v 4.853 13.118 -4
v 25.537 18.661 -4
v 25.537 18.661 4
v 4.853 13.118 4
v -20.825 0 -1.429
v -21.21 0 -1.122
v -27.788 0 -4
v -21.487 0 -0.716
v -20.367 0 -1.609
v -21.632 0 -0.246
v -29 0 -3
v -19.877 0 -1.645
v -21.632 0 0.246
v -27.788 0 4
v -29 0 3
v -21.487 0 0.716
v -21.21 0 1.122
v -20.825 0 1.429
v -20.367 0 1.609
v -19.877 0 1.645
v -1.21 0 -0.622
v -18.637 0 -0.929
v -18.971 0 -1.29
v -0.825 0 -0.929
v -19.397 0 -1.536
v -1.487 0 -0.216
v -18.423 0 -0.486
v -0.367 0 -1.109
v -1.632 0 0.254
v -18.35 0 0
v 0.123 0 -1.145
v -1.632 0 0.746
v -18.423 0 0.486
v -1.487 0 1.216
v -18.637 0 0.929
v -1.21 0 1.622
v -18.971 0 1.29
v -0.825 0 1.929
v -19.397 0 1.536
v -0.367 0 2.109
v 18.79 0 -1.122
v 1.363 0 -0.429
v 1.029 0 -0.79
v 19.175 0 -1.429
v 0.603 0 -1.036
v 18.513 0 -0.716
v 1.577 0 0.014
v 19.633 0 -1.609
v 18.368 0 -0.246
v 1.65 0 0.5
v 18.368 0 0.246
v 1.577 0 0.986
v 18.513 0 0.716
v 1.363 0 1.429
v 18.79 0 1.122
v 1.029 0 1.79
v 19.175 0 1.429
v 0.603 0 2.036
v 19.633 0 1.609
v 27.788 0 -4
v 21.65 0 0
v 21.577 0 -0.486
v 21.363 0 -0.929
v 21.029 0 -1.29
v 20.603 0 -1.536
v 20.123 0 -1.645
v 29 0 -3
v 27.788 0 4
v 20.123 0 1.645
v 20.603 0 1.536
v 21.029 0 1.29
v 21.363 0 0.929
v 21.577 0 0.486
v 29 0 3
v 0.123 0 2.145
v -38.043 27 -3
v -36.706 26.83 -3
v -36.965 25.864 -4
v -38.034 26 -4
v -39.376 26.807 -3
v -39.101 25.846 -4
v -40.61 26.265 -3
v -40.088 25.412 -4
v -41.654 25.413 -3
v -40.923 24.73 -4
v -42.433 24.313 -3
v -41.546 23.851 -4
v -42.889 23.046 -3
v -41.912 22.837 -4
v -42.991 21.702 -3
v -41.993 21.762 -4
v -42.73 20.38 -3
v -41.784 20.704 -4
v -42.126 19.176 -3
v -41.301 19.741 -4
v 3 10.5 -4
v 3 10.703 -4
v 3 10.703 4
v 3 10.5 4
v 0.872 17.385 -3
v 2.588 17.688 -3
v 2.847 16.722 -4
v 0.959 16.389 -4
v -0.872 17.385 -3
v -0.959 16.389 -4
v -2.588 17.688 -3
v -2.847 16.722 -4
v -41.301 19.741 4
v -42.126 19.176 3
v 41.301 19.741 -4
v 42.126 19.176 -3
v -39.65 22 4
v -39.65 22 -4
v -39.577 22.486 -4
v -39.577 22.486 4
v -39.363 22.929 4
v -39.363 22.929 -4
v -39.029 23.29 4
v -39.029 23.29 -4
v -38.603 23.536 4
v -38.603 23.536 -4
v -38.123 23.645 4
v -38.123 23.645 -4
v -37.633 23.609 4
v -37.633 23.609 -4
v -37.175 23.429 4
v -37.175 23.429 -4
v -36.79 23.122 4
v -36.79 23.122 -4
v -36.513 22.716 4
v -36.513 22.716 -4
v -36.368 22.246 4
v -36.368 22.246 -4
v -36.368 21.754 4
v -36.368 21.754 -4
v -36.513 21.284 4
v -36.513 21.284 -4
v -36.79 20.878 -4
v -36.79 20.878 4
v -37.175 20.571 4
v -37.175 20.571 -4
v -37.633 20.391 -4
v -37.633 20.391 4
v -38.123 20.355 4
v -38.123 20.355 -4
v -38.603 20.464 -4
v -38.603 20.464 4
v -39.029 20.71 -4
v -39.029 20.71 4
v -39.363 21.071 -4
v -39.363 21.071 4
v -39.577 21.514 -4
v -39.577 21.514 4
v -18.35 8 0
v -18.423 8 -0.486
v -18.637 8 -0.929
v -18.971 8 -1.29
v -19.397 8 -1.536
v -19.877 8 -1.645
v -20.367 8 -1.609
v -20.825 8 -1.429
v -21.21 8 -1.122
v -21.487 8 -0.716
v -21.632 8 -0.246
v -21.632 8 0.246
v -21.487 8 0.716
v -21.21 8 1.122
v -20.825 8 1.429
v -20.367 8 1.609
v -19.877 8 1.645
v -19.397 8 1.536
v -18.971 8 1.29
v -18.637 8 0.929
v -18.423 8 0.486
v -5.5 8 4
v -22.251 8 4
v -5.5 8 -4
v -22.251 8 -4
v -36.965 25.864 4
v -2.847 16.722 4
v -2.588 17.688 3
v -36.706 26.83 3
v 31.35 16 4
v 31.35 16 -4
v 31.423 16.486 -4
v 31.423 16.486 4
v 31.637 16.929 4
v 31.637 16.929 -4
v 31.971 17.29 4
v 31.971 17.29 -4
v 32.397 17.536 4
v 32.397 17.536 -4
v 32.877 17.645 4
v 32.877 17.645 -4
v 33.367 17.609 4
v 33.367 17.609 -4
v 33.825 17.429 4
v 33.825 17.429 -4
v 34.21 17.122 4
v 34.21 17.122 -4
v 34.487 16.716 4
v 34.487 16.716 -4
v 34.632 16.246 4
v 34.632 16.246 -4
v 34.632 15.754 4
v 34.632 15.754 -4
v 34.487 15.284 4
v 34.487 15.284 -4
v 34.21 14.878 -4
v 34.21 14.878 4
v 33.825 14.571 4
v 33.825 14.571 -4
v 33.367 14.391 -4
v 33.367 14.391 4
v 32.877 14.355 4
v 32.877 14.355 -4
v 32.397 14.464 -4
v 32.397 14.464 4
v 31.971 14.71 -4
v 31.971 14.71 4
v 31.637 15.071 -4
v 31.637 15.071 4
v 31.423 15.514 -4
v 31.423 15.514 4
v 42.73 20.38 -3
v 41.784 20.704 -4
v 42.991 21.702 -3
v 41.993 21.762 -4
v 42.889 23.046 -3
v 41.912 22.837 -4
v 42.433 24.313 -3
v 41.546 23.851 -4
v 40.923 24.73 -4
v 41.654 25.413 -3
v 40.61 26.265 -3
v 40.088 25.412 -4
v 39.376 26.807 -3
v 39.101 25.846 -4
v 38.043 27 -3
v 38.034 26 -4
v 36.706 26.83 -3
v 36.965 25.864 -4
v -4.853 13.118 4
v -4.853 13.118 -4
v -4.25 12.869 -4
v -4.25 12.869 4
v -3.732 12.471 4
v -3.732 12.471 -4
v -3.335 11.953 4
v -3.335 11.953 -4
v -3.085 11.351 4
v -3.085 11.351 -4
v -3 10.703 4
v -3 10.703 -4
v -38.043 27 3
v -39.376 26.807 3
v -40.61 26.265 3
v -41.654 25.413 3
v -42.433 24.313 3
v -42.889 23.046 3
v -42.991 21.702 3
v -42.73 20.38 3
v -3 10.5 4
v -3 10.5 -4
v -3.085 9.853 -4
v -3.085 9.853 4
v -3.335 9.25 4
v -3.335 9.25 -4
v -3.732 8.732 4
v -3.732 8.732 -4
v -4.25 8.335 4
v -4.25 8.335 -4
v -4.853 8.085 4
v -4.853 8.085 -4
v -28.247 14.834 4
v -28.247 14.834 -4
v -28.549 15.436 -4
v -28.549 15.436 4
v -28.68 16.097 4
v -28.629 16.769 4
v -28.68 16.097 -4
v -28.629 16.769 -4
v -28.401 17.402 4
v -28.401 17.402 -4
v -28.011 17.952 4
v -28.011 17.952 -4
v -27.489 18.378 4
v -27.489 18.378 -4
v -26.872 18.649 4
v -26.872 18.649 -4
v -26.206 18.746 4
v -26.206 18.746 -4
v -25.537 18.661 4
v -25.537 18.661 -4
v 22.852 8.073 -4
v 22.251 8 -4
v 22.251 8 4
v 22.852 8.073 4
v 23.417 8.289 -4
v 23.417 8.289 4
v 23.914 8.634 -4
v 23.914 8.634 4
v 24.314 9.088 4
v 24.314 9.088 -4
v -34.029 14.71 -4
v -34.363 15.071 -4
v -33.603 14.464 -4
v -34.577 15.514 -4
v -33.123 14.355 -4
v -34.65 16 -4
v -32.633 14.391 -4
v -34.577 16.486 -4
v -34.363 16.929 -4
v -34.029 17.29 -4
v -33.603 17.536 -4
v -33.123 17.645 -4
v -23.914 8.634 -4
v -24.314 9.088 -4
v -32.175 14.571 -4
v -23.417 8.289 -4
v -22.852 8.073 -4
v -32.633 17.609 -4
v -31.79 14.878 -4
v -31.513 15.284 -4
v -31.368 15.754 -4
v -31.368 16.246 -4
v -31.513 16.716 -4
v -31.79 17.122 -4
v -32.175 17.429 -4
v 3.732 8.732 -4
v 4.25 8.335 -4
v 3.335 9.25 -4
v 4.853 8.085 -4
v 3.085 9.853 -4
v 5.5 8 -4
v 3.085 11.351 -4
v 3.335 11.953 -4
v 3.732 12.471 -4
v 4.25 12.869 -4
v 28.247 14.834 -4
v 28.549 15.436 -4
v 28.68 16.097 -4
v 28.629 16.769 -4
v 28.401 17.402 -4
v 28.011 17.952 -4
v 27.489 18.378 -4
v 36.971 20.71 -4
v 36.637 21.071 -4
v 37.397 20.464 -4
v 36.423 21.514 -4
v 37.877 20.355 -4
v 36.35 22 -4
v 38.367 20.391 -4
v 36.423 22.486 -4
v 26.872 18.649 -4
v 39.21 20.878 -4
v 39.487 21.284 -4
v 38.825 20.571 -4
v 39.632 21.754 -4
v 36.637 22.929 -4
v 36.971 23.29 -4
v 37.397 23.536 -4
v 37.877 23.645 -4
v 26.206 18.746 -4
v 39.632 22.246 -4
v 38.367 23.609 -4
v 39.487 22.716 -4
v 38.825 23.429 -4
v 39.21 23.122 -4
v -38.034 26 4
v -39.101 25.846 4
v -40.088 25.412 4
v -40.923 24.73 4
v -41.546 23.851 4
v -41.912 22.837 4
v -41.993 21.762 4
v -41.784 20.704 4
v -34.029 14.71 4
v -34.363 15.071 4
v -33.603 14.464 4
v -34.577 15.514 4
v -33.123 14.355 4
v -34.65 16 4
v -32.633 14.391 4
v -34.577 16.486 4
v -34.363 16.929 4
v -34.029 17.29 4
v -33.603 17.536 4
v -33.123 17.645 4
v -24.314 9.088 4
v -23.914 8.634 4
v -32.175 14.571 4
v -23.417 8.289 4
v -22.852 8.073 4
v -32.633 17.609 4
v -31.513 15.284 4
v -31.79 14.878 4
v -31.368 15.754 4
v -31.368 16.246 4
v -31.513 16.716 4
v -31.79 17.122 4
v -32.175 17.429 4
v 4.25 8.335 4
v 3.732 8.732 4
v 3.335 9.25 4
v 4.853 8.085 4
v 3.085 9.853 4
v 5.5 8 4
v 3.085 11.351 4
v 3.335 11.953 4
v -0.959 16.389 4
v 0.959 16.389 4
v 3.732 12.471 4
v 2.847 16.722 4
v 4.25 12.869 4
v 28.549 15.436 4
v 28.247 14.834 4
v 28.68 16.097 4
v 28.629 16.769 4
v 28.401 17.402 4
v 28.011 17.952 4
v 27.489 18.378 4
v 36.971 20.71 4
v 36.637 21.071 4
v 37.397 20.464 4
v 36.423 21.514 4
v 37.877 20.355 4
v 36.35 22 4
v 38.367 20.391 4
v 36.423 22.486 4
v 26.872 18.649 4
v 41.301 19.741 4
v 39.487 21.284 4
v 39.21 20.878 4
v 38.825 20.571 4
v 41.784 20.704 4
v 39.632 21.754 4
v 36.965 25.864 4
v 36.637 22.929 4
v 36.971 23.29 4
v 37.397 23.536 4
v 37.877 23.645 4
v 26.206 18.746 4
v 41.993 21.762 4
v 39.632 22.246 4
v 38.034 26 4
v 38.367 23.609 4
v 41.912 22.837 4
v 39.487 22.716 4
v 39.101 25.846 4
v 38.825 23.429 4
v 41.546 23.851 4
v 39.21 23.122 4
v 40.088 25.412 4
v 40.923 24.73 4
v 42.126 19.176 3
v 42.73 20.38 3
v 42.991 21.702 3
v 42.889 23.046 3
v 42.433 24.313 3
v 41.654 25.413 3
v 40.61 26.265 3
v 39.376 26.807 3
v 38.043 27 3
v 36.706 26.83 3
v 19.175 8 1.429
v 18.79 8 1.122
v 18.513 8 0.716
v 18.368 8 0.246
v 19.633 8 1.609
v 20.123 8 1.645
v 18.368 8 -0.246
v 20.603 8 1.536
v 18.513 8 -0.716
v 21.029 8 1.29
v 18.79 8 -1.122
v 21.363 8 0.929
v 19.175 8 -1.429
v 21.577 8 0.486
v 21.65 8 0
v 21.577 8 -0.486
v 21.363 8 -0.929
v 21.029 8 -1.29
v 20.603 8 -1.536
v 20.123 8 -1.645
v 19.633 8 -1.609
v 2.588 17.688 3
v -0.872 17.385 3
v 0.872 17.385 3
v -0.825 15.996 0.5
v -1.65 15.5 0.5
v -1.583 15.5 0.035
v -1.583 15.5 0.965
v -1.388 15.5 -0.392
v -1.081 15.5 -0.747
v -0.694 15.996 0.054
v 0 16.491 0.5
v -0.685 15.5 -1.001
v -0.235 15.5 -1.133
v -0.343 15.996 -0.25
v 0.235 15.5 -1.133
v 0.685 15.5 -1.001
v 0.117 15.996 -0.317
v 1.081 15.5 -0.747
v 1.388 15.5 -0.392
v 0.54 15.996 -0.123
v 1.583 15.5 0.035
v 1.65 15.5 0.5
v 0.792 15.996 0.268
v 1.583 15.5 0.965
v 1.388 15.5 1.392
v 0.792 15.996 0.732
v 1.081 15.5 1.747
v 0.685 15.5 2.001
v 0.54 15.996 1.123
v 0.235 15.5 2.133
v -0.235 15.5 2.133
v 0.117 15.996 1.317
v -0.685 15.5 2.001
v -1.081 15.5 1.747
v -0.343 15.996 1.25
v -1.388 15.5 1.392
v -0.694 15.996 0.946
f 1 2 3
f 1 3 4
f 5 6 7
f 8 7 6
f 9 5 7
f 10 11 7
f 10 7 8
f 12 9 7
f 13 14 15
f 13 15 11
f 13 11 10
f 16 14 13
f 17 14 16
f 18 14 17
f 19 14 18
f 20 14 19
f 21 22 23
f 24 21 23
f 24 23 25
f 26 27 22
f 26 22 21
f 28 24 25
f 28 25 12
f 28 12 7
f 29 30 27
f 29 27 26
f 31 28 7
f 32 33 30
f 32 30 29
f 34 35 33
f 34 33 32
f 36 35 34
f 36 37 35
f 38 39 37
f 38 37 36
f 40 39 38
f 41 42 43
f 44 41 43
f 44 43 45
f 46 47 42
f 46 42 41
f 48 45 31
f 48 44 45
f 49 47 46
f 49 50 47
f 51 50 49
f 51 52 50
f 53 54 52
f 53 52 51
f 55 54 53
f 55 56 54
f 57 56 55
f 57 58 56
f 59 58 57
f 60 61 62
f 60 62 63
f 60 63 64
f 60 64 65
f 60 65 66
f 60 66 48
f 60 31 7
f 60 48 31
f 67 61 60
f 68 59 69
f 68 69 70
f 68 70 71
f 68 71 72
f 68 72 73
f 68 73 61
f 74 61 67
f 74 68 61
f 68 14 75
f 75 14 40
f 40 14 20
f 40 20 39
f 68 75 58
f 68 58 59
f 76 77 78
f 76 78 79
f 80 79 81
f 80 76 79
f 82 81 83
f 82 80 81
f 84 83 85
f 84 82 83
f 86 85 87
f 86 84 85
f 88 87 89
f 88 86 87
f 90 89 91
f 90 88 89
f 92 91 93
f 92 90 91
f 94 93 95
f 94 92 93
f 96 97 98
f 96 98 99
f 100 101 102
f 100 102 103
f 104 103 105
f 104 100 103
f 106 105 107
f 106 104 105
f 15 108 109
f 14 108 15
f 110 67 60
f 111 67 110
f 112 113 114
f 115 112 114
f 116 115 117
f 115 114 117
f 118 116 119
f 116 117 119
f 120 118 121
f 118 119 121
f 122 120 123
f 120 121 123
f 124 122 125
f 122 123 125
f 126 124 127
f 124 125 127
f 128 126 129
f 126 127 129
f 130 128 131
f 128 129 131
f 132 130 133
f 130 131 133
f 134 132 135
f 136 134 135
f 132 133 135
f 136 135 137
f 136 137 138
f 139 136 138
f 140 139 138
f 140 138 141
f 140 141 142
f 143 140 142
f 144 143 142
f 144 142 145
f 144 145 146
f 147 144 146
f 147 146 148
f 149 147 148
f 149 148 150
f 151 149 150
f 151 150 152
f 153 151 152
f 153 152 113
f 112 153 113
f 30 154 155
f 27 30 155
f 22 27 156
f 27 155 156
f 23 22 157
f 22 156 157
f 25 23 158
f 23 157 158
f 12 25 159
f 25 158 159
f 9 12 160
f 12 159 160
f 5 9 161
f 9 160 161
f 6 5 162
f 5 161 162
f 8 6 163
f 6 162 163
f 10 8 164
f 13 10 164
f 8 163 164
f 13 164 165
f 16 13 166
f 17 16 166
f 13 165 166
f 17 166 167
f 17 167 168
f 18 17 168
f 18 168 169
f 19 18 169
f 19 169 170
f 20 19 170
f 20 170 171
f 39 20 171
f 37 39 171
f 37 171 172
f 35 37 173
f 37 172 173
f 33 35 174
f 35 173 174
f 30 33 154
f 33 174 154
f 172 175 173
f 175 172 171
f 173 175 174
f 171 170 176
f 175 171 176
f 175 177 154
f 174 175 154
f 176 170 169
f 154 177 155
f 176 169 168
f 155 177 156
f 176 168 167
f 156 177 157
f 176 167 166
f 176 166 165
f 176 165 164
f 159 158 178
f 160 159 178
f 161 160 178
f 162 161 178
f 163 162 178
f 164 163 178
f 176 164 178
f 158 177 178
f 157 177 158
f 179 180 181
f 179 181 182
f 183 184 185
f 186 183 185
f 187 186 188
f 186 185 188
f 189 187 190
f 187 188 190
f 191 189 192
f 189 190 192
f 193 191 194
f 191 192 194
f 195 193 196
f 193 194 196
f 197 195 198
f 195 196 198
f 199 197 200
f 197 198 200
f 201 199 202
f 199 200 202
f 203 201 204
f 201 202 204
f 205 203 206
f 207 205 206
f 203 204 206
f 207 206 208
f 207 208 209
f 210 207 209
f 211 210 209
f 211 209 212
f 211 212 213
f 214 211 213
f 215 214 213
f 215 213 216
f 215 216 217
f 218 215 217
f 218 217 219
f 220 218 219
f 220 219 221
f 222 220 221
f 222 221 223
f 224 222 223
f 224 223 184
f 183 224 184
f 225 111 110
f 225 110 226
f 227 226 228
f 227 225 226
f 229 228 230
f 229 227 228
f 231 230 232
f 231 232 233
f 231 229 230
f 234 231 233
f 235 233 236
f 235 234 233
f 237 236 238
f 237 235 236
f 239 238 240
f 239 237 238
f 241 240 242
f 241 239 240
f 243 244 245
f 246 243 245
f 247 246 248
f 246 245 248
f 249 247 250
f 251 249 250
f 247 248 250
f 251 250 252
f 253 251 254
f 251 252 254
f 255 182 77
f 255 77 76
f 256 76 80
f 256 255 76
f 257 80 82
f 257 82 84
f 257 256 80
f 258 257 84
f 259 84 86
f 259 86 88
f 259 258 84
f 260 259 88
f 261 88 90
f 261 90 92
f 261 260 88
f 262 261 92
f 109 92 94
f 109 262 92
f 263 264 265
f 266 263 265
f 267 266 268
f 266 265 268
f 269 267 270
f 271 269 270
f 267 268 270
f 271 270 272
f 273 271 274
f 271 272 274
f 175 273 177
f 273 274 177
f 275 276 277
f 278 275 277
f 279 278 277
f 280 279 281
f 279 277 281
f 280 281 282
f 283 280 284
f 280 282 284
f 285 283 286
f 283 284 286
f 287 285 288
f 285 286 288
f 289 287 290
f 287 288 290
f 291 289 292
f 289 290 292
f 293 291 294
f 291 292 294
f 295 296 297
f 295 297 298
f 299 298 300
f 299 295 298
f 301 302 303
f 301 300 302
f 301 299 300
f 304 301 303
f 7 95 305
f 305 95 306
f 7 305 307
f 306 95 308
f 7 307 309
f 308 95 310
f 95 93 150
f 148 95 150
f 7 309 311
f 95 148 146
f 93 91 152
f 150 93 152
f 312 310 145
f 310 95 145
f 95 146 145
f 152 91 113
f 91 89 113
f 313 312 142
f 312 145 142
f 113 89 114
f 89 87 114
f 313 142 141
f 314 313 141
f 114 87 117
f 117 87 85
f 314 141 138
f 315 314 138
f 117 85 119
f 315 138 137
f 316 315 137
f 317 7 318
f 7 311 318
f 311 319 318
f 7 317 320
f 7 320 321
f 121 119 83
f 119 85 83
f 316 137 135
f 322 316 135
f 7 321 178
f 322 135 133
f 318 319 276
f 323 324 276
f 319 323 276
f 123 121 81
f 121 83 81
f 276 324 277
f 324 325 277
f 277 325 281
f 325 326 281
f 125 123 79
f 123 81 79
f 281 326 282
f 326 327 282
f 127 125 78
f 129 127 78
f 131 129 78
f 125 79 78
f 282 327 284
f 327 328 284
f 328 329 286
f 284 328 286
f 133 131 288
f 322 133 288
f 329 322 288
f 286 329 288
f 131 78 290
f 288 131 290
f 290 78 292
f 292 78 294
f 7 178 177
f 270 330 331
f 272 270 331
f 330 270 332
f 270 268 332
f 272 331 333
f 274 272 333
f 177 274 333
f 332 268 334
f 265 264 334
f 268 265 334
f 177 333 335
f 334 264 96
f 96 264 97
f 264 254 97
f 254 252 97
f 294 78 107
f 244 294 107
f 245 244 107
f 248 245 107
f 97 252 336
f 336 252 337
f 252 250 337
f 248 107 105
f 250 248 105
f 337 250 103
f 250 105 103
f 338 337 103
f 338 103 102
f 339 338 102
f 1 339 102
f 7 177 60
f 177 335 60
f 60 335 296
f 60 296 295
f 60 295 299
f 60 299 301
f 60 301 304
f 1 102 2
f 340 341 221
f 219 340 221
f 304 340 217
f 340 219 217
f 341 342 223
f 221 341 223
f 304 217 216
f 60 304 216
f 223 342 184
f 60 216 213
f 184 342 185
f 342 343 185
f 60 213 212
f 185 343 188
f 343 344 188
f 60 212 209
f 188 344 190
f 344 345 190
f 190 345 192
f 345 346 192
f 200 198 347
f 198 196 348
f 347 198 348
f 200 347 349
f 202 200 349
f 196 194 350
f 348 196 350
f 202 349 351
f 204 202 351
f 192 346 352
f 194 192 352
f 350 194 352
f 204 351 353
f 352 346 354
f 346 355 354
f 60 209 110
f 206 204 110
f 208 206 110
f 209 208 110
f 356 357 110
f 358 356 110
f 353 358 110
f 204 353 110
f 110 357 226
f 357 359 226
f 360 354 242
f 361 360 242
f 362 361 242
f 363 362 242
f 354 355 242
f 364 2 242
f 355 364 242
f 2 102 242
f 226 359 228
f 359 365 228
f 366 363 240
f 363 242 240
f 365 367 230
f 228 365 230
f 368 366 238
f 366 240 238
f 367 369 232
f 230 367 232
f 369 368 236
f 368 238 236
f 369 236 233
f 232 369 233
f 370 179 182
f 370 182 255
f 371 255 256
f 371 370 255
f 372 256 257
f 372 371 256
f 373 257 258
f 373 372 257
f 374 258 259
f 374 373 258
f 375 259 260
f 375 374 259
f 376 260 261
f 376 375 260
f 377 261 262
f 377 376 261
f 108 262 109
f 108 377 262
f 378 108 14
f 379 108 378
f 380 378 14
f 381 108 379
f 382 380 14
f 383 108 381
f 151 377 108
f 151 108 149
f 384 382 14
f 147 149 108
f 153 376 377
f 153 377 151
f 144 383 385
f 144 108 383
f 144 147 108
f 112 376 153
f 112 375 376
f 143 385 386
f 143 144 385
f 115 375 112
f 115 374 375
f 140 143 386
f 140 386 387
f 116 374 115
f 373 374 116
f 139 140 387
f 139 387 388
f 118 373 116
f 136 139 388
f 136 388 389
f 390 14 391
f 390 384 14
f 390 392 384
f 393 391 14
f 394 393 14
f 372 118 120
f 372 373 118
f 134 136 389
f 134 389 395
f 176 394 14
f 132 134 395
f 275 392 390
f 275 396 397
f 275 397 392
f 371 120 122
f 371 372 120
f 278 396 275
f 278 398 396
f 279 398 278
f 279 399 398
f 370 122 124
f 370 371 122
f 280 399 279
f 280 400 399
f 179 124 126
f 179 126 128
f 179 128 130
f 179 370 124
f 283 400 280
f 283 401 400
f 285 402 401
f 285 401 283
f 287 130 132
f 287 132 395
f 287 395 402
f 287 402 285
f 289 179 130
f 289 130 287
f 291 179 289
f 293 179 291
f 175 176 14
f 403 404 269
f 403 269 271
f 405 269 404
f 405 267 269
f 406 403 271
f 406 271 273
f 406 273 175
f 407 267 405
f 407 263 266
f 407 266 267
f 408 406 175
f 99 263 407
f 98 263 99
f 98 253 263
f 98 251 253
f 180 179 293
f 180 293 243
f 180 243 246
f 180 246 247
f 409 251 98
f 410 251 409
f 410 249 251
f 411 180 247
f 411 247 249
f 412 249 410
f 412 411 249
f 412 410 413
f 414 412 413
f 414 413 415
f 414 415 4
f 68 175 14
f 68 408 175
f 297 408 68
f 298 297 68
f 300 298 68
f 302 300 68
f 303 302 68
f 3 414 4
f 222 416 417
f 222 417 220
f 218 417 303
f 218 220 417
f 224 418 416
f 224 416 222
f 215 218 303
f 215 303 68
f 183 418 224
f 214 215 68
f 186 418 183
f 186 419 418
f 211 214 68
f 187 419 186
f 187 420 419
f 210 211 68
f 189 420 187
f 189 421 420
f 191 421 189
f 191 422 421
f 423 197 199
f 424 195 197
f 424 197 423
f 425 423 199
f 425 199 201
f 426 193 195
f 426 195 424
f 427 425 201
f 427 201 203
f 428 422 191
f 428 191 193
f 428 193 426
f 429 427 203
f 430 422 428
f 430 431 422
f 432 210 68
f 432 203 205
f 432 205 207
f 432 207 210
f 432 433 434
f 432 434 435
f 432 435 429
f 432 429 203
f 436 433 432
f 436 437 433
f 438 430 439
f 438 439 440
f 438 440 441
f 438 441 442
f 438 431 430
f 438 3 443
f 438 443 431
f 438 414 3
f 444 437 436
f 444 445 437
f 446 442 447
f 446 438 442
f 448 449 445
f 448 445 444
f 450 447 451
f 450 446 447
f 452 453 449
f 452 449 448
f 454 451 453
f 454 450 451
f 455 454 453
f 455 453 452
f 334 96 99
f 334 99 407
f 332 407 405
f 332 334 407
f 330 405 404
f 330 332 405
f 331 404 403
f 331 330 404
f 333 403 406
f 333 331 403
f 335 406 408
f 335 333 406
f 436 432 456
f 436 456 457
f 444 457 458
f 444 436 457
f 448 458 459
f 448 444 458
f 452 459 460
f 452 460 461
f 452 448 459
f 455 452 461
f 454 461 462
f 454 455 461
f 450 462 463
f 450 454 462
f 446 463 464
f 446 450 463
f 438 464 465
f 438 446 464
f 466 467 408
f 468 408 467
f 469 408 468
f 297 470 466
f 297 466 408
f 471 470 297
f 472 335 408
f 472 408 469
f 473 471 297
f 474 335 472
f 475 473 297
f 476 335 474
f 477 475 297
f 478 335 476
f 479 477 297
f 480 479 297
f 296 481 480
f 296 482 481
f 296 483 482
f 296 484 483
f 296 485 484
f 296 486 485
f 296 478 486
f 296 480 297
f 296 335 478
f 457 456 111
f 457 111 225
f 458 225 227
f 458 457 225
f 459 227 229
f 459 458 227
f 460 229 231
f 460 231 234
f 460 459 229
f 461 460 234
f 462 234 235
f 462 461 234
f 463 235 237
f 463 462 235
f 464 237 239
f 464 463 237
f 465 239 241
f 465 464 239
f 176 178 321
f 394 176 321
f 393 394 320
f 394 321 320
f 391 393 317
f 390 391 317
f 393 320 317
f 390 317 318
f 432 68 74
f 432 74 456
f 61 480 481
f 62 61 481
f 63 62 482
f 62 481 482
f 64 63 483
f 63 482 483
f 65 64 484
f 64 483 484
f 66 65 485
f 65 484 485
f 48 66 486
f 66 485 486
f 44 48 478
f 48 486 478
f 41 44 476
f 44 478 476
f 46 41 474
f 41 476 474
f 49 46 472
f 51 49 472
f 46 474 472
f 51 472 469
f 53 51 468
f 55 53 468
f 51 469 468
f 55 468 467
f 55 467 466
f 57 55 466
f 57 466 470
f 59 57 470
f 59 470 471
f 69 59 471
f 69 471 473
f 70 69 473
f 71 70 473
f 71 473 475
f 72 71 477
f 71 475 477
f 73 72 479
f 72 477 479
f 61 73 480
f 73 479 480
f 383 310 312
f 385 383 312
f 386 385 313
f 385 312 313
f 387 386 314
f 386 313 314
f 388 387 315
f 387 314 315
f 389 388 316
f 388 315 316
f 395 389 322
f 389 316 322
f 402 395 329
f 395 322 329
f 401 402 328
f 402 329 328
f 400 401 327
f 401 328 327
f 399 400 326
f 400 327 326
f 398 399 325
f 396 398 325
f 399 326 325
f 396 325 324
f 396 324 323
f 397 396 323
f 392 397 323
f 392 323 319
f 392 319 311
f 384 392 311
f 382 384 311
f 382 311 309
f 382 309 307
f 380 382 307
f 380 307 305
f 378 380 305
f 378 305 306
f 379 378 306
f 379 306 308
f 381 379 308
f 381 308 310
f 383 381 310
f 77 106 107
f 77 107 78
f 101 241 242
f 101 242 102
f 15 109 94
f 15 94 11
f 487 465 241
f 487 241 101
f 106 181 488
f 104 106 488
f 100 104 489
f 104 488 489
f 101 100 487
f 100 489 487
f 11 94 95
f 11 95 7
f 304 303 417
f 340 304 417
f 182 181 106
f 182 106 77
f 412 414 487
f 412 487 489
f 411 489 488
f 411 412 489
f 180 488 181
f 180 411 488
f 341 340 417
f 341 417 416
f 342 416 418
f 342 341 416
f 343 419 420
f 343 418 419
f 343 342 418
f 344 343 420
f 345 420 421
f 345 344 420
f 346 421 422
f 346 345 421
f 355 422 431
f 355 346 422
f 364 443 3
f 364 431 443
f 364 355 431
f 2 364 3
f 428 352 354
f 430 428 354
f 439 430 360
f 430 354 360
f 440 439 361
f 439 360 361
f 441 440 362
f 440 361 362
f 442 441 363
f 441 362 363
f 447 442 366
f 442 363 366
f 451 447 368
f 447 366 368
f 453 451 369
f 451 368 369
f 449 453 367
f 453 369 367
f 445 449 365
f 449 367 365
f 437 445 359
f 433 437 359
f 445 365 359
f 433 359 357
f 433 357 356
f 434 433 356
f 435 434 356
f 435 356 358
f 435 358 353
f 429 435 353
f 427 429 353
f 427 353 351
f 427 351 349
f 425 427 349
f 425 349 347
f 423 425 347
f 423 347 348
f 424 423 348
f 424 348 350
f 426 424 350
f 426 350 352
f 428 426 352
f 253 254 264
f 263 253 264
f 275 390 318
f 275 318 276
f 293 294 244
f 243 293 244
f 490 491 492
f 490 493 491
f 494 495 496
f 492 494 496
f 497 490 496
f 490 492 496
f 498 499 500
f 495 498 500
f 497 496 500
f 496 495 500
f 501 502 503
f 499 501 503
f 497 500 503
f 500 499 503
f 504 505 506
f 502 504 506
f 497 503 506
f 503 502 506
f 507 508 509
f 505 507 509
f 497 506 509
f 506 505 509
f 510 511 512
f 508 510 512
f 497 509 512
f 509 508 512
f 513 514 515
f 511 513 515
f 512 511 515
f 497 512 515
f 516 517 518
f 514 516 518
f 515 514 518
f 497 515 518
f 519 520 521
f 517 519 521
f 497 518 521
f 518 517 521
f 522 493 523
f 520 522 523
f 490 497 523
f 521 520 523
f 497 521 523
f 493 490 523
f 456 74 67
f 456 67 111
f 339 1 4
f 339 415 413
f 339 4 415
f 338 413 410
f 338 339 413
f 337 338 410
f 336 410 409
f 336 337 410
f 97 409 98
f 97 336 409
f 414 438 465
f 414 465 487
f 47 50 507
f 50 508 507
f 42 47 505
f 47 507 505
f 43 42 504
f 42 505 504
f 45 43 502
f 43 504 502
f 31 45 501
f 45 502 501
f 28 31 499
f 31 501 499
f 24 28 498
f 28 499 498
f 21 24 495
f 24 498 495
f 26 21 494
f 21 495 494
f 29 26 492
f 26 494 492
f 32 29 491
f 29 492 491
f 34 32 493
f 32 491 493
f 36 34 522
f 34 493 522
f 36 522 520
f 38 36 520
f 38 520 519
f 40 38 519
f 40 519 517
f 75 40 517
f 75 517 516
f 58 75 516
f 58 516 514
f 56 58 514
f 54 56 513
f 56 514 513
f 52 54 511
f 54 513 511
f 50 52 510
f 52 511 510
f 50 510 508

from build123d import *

# Parameters (mm, degrees)
BOSS_EXTRU_1_DEPTH      = 4
TROU_TARAUD_M42_D       = 3.3
TROU_TARAUD_M43_D       = 3.3
TROU_TARAUD_M43_DEPTH   = 15.5
TROU_TARAUD_M43_TIP     = 0.991420021
CONG_1_R                = 10
ENL_V_START             = -9
ENL_V_MAT_EXTRU_1_DEPTH = 10
CHANFREIN1_SIZE         = 1


with BuildPart() as part:
    # Esquisse1 → Boss.-Extru.1 (new body, symmetric)
    with BuildSketch(Plane.XY):
        with BuildLine():
            Line((-29, 0), (29, 0))
            Line((29, 0), (42.125962847, 19.175742472))
            ThreePointArc((42.125962847, 19.175742472), (42.080485732, 24.889573705), (36.705904774, 26.829629131))
            Line((36.705904774, 26.829629131), (0, 16.99431159))
            Line((0, 16.99431159), (-36.705904774, 26.829629131))
            ThreePointArc((-36.705904774, 26.829629131), (-42.080485732, 24.889573705), (-42.125962847, 19.175742472))
            Line((-42.125962847, 19.175742472), (-29, 0))
        make_face()
    extrude(amount=BOSS_EXTRU_1_DEPTH, both=True)

    # Trou taraudé M42 (through all)
    with Locations(Plane.XY.offset(4)):
        with Locations((-38, 22), (38, 22), (-33, 16), (33, 16)):
            Hole(TROU_TARAUD_M42_D / 2)

    # Trou taraudé M43
    with Locations(Plane(origin=(0, 0, 0), x_dir=(-1, 0, 0), z_dir=(0, -1, 0))):
        with Locations((20, 0), (-20, 0), (0, -0.5)):
            Hole(TROU_TARAUD_M43_D / 2, depth=TROU_TARAUD_M43_DEPTH)
            with Locations((0, 0, -(TROU_TARAUD_M43_DEPTH + TROU_TARAUD_M43_TIP / 2))):  # 118° drill point
                Cone(0, TROU_TARAUD_M43_D / 2, TROU_TARAUD_M43_TIP, mode=Mode.SUBTRACT)

    # Congé1
    cong_1_edges = [part.edges().sort_by_distance(p)[0] for p in [
        (0, 16.99431159, 0),
    ]]
    fillet(cong_1_edges, radius=CONG_1_R)

    # Esquisse8 → Enlèv. mat.-Extru.1 (cut)
    with BuildSketch(Plane.XY.offset(4).offset(ENL_V_START)):
        with BuildLine():
            Line((-3, 10.703460795), (-3, 10.5))
            ThreePointArc((-3, 10.5), (-3.732233047, 8.732233047), (-5.5, 8))
            Line((-5.5, 8), (-22.251200511, 8))
            ThreePointArc((-22.251200511, 8), (-23.417321879, 8.288629168), (-24.314181934, 9.087871236))
            Line((-24.314181934, 9.087871236), (-28.247222943, 14.833657842))
            ThreePointArc((-28.247222943, 14.833657842), (-28.224484386, 17.690573459), (-25.537193907, 18.660601172))
            Line((-25.537193907, 18.660601172), (-4.852952387, 13.118275361))
            ThreePointArc((-4.852952387, 13.118275361), (-3.516616649, 12.225364367), (-3, 10.703460795))
        make_face()
    enl_v_mat_extru_1 = extrude(amount=ENL_V_MAT_EXTRU_1_DEPTH, mode=Mode.SUBTRACT)

    # Symétrie1: Enlèv. mat.-Extru.1 across plane
    add(enl_v_mat_extru_1.mirror(Plane(origin=(0, 0, 0), x_dir=(0, 0, 1), z_dir=(1, 0, 0))), mode=Mode.SUBTRACT)

    # Chanfrein1
    chanfrein1_edges = [part.edges().sort_by_distance(p)[0] for p in [
        (-35.562981423, 9.587871236, -4),
        (-42.080485732, 24.889573705, 4),
        (-42.080485732, 24.889573705, -4),
        (-19.647047613, 22.258722131, -4),
        (-35.562981423, 9.587871236, 4),
        (35.562981423, 9.587871236, 4),
        (42.080485732, 24.889573705, 4),
        (-19.647047613, 22.258722131, 4),
        (19.647047613, 22.258722131, -4),
        (19.647047613, 22.258722131, 4),
        (0, 17.347073394, -4),
        (0, 17.347073394, 4),
        (42.080485732, 24.889573705, -4),
        (35.562981423, 9.587871236, -4),
    ]]
    chamfer(chanfrein1_edges, length=CHANFREIN1_SIZE)


solid = part.part
